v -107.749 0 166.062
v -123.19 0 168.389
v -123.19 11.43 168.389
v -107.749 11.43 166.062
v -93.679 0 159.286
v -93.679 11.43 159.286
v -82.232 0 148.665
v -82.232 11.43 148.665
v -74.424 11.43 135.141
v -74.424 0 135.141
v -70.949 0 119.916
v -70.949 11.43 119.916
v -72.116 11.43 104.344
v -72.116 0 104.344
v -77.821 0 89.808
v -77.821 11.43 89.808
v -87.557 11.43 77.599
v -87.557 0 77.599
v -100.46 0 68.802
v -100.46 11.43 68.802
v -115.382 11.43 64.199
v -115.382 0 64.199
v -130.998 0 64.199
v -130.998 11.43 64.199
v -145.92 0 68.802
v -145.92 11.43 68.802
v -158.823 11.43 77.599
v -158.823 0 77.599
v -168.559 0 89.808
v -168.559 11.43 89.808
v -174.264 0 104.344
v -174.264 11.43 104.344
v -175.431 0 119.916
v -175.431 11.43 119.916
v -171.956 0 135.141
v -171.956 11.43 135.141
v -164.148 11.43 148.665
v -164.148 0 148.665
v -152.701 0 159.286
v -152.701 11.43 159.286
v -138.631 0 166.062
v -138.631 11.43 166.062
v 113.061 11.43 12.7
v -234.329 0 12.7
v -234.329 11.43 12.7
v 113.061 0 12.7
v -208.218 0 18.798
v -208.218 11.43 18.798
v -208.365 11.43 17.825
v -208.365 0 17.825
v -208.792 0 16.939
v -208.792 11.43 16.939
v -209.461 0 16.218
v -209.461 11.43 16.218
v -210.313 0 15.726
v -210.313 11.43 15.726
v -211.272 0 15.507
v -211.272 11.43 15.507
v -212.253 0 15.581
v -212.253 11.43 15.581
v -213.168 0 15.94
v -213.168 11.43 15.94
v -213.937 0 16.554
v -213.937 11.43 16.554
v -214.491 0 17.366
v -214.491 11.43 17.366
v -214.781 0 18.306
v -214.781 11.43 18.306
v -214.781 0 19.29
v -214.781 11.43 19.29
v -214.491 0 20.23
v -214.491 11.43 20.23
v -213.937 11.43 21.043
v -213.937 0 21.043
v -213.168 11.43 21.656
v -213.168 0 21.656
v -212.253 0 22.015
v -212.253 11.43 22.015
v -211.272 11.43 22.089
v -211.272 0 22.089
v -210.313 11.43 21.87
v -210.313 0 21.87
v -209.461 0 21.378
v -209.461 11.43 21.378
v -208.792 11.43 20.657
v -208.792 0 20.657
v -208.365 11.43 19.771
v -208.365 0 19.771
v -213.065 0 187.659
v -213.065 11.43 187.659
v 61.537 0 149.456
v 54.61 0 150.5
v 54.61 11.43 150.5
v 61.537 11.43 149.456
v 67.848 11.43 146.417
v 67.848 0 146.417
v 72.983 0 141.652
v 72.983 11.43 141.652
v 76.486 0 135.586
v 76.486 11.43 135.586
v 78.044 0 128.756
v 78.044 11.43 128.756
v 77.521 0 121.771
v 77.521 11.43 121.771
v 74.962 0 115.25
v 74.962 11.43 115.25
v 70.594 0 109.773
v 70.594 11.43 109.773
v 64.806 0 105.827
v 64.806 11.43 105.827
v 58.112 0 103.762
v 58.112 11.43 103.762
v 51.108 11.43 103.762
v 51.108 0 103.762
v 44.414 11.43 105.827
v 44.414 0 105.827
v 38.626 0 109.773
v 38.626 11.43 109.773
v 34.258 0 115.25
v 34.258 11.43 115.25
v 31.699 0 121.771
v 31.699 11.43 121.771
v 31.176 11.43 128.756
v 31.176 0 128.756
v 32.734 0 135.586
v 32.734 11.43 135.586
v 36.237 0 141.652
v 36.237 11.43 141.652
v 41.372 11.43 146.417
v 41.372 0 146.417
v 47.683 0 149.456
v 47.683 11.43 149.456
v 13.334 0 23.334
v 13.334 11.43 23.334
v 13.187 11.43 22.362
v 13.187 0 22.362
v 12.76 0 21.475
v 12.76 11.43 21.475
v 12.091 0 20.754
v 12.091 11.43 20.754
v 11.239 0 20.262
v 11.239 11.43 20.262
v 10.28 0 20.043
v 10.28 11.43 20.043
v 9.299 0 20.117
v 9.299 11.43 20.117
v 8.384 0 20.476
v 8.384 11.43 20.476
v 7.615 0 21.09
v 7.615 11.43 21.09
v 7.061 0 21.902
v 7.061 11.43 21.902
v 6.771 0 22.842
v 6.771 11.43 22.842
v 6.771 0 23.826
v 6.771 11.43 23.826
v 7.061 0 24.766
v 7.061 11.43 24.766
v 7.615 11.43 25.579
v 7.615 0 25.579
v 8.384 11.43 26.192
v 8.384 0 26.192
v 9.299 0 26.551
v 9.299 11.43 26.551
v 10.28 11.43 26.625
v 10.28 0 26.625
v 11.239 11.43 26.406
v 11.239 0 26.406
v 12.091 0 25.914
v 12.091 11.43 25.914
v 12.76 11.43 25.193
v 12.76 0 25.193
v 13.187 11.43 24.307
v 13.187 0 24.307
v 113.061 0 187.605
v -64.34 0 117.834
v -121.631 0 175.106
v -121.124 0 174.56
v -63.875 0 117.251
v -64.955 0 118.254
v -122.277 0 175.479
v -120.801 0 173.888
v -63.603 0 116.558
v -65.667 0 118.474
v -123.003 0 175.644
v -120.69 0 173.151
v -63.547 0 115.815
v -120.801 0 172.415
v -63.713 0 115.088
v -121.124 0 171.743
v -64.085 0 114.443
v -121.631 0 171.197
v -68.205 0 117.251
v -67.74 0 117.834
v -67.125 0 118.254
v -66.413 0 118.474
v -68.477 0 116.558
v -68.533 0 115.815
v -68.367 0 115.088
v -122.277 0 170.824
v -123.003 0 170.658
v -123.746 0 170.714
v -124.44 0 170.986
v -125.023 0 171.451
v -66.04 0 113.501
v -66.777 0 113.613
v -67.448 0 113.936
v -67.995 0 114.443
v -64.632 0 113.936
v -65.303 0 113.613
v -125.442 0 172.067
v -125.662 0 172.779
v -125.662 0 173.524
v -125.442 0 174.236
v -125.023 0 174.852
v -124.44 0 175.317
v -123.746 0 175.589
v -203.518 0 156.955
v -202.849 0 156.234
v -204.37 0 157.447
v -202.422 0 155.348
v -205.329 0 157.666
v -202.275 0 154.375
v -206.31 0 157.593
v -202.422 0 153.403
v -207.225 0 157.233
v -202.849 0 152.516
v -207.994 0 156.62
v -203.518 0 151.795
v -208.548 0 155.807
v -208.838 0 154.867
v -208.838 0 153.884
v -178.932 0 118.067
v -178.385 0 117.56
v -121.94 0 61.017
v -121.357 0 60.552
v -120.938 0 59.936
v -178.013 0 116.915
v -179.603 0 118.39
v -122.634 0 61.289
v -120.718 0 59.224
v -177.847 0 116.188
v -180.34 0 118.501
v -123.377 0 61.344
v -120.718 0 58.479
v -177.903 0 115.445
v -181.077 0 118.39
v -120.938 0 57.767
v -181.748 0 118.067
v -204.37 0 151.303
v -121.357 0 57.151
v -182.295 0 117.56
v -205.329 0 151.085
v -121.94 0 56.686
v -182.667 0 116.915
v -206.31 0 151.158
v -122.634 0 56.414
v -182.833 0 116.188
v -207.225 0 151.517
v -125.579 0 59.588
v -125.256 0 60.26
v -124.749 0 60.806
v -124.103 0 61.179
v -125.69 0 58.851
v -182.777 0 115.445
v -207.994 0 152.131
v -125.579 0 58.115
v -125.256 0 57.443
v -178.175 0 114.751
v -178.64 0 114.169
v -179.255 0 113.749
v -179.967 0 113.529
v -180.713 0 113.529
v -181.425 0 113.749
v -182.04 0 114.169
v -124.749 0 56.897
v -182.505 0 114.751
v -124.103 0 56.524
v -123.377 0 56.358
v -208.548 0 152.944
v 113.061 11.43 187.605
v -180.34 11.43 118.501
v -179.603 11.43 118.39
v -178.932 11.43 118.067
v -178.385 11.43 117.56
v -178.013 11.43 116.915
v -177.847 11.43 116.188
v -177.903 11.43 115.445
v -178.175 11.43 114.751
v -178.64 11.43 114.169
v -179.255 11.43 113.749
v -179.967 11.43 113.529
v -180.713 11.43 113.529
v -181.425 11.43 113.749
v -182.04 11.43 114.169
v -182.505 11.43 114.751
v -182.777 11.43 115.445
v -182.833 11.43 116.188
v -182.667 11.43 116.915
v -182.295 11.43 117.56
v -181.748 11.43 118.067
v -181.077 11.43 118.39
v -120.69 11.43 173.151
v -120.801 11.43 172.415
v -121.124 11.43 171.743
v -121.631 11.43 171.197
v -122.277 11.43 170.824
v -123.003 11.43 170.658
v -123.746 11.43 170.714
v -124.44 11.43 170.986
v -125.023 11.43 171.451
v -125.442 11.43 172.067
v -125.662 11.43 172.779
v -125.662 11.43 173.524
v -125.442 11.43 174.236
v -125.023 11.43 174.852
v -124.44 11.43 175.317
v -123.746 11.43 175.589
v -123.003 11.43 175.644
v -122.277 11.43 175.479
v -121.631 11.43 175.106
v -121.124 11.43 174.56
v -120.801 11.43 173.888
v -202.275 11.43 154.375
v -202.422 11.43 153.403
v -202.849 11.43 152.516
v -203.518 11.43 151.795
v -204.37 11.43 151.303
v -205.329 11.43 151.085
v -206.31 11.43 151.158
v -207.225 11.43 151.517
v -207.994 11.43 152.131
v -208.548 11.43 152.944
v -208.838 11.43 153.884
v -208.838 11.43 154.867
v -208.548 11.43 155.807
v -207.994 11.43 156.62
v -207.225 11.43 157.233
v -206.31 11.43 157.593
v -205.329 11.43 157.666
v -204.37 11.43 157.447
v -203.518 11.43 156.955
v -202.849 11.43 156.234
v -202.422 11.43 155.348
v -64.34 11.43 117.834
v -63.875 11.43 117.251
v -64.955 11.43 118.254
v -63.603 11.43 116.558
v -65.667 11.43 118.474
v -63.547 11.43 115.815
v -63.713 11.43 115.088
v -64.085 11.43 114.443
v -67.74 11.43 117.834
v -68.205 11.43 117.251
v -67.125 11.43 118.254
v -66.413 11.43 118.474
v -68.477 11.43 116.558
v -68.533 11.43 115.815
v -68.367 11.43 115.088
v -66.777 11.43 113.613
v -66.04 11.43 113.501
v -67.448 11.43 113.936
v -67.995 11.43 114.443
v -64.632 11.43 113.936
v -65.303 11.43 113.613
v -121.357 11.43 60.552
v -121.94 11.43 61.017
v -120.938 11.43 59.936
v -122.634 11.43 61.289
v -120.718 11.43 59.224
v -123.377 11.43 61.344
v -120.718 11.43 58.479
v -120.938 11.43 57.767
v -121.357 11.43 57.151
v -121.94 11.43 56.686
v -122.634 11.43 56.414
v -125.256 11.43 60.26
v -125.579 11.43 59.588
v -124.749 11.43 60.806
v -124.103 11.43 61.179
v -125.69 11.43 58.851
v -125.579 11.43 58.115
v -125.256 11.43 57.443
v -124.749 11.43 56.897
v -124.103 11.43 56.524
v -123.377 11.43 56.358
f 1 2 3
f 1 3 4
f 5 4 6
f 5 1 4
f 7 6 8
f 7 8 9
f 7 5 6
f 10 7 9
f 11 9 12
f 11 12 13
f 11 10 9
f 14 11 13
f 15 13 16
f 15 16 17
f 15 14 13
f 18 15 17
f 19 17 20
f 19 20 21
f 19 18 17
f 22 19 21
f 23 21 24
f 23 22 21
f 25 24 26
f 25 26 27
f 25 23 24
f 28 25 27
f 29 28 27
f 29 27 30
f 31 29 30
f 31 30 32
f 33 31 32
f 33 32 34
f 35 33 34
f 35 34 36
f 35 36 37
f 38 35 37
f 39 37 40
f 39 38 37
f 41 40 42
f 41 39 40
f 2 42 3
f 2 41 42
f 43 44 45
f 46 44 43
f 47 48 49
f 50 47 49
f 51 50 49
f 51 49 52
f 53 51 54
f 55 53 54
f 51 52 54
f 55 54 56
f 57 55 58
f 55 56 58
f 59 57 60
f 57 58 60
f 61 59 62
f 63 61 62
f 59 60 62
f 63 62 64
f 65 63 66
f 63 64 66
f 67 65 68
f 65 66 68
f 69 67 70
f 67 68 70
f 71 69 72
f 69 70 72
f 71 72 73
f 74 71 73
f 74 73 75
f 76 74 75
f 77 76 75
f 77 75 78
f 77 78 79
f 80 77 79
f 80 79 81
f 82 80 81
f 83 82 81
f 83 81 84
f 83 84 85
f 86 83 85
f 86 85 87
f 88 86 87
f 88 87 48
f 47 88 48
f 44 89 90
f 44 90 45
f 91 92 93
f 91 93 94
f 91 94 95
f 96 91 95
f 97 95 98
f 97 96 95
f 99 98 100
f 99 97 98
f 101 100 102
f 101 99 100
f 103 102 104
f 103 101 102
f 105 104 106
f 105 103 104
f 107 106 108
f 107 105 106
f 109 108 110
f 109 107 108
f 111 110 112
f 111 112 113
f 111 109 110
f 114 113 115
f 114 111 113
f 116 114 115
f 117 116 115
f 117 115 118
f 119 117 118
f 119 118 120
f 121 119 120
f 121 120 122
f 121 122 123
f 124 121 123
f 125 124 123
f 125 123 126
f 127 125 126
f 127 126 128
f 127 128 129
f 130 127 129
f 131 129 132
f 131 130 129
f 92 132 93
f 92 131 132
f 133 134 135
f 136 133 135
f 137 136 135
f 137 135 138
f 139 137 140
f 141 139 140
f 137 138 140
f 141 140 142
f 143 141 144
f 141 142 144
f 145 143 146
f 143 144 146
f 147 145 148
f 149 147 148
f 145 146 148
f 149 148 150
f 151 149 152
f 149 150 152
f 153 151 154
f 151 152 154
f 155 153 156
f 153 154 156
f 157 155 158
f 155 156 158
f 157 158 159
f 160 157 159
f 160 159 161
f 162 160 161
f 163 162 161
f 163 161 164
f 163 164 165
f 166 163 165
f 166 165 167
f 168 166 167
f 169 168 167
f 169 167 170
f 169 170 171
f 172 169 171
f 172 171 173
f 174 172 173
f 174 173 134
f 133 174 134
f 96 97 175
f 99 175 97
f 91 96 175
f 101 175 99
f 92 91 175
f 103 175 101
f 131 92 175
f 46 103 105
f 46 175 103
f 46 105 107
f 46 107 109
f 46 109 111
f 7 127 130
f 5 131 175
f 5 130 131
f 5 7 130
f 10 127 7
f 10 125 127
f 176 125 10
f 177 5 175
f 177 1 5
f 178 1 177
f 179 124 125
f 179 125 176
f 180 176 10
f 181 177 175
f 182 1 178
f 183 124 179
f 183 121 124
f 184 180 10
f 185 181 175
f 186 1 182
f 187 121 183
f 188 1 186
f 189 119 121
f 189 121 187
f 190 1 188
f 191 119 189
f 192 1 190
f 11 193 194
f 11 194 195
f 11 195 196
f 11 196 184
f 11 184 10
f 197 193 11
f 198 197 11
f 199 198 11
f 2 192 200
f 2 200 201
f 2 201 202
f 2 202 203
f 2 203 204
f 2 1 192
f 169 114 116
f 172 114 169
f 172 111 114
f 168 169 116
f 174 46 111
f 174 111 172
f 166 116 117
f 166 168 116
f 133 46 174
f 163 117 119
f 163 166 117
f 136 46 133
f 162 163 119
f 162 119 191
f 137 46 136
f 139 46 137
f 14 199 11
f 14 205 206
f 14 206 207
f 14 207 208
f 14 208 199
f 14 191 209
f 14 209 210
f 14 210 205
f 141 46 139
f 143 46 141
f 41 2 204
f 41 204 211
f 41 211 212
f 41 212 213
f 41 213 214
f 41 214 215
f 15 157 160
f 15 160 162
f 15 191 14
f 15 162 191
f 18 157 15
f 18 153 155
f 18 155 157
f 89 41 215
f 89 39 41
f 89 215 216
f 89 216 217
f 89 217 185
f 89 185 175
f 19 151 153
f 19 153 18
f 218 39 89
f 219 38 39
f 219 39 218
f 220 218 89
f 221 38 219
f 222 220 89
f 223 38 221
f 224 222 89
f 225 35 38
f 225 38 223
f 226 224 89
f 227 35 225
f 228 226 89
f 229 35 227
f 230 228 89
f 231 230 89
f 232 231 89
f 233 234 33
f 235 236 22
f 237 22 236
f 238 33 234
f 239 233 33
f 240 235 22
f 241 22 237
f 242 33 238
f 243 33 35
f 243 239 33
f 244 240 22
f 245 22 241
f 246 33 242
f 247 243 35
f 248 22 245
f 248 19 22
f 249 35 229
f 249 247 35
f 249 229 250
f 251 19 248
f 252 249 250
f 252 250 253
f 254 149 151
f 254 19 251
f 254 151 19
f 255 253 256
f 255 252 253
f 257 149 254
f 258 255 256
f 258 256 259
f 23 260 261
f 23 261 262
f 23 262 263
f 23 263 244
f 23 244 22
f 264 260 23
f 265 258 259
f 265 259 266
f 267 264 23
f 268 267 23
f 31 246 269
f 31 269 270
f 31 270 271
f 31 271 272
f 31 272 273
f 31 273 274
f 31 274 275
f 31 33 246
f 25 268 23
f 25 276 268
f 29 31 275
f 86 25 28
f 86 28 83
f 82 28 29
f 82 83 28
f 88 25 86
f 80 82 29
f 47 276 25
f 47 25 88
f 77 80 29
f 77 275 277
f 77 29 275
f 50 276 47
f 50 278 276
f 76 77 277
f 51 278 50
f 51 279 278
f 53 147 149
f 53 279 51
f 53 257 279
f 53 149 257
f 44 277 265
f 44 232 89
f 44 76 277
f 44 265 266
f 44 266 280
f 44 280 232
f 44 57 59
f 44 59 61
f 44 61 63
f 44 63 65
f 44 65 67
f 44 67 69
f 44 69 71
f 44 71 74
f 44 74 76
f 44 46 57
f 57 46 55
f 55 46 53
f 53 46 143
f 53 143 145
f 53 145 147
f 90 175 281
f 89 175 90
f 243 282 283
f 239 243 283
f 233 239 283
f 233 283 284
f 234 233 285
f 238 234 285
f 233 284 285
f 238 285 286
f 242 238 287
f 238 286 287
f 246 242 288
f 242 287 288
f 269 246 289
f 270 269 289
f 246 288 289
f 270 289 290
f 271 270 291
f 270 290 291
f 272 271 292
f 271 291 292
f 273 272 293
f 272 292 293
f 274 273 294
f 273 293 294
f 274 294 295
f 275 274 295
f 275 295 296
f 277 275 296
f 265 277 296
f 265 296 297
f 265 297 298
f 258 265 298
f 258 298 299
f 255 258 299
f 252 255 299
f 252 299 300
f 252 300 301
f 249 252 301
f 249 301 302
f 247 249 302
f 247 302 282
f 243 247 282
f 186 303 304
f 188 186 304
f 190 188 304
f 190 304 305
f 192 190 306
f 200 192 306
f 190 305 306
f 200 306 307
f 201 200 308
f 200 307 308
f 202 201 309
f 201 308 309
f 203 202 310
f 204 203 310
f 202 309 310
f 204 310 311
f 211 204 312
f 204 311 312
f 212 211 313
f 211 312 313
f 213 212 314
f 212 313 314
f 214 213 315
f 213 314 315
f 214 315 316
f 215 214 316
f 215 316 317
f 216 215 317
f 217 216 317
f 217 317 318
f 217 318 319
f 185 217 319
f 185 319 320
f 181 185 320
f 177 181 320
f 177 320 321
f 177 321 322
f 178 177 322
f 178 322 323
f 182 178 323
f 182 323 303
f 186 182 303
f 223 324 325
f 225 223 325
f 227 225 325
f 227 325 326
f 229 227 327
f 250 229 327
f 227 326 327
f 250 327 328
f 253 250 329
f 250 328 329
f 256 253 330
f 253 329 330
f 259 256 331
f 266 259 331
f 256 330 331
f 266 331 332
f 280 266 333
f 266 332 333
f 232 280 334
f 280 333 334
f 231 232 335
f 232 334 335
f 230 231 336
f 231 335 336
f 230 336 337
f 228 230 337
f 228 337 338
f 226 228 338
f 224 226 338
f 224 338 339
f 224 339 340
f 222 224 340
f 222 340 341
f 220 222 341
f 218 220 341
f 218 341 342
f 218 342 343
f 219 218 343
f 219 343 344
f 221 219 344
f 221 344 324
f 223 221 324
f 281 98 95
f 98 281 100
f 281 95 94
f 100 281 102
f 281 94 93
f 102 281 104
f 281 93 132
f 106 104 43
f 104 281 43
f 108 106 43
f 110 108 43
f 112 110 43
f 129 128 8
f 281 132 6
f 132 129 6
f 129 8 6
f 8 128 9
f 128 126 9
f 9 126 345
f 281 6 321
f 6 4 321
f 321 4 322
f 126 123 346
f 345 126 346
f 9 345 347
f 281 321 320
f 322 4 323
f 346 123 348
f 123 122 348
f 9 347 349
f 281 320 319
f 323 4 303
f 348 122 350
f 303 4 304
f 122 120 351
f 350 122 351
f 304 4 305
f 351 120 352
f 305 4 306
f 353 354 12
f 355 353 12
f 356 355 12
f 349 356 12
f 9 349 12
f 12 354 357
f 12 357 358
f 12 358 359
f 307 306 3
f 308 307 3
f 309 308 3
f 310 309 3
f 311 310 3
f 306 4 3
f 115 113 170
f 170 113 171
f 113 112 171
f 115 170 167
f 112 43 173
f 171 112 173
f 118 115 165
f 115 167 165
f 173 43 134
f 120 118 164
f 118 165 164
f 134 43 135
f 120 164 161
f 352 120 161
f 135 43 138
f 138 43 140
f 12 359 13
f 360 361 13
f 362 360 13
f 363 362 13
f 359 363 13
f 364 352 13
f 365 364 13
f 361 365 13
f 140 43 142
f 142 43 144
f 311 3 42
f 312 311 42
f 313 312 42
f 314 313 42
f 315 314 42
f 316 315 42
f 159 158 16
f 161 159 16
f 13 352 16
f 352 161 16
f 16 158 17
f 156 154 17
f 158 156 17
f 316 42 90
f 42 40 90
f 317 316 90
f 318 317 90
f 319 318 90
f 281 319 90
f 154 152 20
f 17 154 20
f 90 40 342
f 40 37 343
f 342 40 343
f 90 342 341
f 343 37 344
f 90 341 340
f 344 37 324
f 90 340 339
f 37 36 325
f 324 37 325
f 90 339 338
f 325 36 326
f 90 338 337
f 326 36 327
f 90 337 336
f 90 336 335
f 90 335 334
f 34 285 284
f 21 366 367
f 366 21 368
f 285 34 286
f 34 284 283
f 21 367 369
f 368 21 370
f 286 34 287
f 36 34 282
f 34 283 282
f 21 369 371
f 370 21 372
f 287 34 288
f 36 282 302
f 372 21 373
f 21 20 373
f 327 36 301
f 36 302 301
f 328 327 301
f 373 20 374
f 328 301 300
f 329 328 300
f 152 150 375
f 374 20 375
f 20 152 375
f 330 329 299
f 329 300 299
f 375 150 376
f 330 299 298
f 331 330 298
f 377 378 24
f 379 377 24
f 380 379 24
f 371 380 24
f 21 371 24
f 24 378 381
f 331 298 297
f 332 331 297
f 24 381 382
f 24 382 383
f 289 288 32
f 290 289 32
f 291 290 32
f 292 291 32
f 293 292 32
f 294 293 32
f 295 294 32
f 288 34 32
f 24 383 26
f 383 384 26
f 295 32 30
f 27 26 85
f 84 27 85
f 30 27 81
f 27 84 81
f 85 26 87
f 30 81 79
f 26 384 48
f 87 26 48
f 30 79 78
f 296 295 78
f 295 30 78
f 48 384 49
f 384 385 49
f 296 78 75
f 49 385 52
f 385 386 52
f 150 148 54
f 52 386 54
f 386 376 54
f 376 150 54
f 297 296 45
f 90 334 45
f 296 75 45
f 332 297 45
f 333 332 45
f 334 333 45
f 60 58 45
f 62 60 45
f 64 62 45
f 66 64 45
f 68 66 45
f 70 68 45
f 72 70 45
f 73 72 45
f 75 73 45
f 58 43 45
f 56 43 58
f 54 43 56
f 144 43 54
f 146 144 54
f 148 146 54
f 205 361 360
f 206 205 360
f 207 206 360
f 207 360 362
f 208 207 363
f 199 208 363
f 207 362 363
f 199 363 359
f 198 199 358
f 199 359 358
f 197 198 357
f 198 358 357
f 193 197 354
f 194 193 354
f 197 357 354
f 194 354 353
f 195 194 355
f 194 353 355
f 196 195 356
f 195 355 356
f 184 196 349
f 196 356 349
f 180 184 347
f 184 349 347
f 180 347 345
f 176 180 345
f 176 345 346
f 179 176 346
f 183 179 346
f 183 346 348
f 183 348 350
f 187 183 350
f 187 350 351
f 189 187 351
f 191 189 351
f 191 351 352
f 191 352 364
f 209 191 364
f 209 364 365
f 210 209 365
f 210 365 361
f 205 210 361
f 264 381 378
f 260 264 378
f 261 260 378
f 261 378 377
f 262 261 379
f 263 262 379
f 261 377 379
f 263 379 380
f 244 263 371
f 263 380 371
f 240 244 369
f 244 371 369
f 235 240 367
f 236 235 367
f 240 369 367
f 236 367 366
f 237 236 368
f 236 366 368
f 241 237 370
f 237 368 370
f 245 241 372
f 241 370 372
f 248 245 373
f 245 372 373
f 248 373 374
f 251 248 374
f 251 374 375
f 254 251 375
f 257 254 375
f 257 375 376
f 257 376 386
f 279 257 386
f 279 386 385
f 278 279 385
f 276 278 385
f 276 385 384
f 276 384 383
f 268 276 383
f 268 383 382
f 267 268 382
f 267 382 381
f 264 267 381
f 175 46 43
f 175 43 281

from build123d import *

# Parameters (mm, degrees)
SKETCH1_R             = 52.3875
SKETCH1_R_2           = 23.5
BOSS_EXTRUDE1_DEPTH   = 11.43
M6_CLEARANCE_HOLE1_D  = 6.6
F_5_0MM_DOWEL_HOLE1_D = 5
CIRPATTERN1_COUNT     = 4


with BuildPart() as part:
    # Sketch1 → Boss-Extrude1 (new body)
    with BuildSketch(Plane(origin=(0, 0, 0), x_dir=(1, 0, 0), z_dir=(0, 1, 0))):
        Polygon((-234.329030184, -12.7), (113.061428613, -12.7), (113.061428613, -187.604888893), (-213.064788009, -187.65872147), align=None)
        with Locations(Location((-123.19, -116.001477372, 0), (0, 0, 270))):
            Circle(SKETCH1_R, mode=Mode.SUBTRACT)
        with Locations(Location((54.61, -127, 0), (0, 0, 270))):
            Circle(SKETCH1_R_2, mode=Mode.SUBTRACT)
    extrude(amount=BOSS_EXTRUDE1_DEPTH)

    # M6 Clearance Hole1 (through all)
    with Locations(Plane(origin=(0, 0, 0), x_dir=(-1, 0, 0), z_dir=(0, -1, 0))):
        with Locations((-10.033704867, -23.334197365), (211.518182886, -18.798178744), (205.575185514, -154.375359311)):
            Hole(M6_CLEARANCE_HOLE1_D / 2)

    # Ø5.0mm Dowel Hole1 (through all)
    with Locations(Plane(origin=(0, 0, 0), x_dir=(-1, 0, 0), z_dir=(0, -1, 0))):
        with Locations((123.19, -173.151477372)):
            f_5_0mm_dowel_hole1 = Hole(F_5_0MM_DOWEL_HOLE1_D / 2)

    # CirPattern1: Ø5.0mm Dowel Hole1 ×4 about axis
    cirpattern1_axis = Axis((-123.19, 0, 116.001477372), (0, 1, 0))
    for i in range(1, CIRPATTERN1_COUNT):
        add(f_5_0mm_dowel_hole1.rotate(cirpattern1_axis, i * 360 / CIRPATTERN1_COUNT), mode=Mode.SUBTRACT)


solid = part.part
